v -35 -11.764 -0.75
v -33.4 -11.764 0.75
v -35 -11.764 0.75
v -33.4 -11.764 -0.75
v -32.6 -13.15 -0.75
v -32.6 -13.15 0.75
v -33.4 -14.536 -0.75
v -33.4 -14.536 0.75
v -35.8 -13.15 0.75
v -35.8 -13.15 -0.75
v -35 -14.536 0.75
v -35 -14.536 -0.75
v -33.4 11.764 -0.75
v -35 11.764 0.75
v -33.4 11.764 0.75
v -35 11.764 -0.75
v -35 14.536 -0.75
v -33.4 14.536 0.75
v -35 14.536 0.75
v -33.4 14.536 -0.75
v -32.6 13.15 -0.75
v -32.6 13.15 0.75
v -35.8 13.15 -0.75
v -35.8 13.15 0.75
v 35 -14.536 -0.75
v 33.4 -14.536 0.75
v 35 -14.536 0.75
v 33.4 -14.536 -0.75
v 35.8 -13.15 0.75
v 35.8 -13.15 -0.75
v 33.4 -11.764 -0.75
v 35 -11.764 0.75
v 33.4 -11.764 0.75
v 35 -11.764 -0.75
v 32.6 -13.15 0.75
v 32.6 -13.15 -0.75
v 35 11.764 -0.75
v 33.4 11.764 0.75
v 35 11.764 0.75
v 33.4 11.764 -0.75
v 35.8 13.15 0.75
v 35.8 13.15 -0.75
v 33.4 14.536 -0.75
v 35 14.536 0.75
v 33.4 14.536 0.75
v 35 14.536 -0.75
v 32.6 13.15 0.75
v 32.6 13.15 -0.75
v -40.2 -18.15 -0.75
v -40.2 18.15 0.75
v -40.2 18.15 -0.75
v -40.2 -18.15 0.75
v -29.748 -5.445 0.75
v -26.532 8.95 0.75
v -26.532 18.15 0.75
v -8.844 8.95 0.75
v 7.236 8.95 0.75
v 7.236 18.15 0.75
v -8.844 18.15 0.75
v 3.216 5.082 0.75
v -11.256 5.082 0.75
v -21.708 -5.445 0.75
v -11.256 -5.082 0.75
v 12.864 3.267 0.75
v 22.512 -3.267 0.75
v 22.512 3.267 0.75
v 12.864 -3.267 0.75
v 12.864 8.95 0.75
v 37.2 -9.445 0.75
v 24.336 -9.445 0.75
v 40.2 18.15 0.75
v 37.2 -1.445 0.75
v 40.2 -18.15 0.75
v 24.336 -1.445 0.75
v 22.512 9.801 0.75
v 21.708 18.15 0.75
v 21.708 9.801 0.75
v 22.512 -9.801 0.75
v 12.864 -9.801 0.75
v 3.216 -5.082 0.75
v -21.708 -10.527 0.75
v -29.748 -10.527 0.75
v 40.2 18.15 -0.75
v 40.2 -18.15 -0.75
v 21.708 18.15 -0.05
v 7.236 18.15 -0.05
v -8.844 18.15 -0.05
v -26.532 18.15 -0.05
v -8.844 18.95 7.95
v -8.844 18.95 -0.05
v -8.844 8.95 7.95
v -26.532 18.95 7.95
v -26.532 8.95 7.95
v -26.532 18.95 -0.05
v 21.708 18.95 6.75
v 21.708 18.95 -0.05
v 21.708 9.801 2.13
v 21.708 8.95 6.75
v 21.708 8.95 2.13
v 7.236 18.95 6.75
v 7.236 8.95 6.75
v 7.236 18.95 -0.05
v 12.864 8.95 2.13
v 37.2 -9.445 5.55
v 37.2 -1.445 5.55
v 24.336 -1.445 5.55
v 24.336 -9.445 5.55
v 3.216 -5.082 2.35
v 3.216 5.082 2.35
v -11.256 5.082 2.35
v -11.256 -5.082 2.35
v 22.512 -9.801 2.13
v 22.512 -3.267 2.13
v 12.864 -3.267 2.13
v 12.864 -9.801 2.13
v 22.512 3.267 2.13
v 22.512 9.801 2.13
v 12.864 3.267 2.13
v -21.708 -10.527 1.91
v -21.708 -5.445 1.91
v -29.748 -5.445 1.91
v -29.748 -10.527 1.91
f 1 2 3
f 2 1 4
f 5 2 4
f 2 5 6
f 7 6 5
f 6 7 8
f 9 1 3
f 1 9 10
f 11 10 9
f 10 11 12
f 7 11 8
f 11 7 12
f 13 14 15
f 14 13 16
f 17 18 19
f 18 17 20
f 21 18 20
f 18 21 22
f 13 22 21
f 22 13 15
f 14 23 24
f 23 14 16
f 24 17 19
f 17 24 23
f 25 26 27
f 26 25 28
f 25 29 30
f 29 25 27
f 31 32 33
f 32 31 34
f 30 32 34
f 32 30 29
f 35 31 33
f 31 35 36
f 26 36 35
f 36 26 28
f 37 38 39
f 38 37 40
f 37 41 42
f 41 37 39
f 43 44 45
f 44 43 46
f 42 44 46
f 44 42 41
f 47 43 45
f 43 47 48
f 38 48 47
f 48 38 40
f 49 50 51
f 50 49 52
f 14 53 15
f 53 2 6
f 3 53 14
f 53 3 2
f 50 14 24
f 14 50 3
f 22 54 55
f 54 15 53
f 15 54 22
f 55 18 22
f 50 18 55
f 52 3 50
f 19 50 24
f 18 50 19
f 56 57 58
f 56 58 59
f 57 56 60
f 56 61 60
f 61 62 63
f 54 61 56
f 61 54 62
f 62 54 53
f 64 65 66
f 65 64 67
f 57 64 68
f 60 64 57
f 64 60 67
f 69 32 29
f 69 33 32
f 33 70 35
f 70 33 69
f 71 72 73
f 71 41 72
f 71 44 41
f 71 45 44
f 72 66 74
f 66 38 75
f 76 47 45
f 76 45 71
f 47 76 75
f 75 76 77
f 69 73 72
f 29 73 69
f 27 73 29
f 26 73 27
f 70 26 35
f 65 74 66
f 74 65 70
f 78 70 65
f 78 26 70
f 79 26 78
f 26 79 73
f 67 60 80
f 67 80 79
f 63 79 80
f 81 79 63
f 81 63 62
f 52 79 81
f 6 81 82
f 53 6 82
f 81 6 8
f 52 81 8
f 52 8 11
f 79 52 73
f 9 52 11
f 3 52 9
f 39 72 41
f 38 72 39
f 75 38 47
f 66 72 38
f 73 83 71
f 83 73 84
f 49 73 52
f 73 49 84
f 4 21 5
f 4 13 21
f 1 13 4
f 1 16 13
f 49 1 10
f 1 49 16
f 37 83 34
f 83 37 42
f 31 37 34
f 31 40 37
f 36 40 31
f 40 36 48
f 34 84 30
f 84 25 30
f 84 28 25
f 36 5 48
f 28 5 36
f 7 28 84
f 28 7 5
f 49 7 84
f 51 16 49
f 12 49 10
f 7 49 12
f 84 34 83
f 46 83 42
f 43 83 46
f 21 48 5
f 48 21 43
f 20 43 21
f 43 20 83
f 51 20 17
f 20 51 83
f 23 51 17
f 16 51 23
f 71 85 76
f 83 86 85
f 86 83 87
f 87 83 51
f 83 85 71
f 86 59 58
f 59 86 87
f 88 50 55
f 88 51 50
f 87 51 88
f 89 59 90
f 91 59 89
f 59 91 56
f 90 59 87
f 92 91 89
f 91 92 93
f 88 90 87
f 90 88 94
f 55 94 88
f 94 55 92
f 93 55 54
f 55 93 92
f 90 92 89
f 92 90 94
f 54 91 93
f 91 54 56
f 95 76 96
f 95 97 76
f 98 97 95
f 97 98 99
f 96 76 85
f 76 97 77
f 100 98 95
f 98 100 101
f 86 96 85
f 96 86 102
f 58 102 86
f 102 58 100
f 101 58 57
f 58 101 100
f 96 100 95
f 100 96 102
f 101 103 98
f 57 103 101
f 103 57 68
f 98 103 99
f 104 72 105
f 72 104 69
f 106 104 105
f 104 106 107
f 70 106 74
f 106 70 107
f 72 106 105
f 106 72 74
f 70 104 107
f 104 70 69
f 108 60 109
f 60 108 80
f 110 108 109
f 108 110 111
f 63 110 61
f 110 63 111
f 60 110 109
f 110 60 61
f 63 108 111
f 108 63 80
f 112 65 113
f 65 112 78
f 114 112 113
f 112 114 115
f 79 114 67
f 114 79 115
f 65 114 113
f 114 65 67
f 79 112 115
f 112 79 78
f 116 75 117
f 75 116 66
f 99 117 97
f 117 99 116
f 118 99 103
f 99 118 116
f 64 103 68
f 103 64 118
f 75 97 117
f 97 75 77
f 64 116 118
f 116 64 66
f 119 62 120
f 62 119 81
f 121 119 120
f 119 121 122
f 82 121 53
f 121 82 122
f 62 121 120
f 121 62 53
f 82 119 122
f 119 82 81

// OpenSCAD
// Parameters
pcb_length = 80.4; //[40.2:160.8:0.1]
pcb_width = 36.3; //[18.15:72.6:0.1]
pcb_thickness = 1.5; //[0.8:3:0.1]
corner_radius = 3; //[1.5:6:0.1]
hole_diameter = 3.2; //[2:5:0.1]
hole_edge_margin_x = 6; //[3:12:0.1]
hole_edge_margin_y = 5; //[3:10:0.1]
hole_cut_extra = 0.4; //[0.2:1.5:0.1]
connectors_height = 8; //[4:16:0.5]
connectors_depth = 10; //[5:20:0.5]
connectors_wall_overlap = 0.8; //[0.5:2:0.1]
chip_height = 2.2; //[1:5:0.1]
chip_overlap = 0.6; //[0.3:1.5:0.1]
silkscreen_height = 0.2; //[0.1:0.6:0.05]
silkscreen_overlap = 0.3; //[0.2:1:0.05]

// Main PCB Body with Rounded Corners
module pcb_main_body() {
  color([0.0, 0.4, 0.2]) // Green PCB
  hull() {
    translate([0, 0, 0])
      cube([pcb_length, pcb_width, pcb_thickness], center=true);
    translate([pcb_length/2 - corner_radius, pcb_width/2 - corner_radius, 0])
      cylinder(r=corner_radius, h=pcb_thickness, center=true);
    translate([-(pcb_length/2 - corner_radius), pcb_width/2 - corner_radius, 0])
      cylinder(r=corner_radius, h=pcb_thickness, center=true);
    translate([-(pcb_length/2 - corner_radius), -(pcb_width/2 - corner_radius), 0])
      cylinder(r=corner_radius, h=pcb_thickness, center=true);
    translate([pcb_length/2 - corner_radius, -(pcb_width/2 - corner_radius), 0])
      cylinder(r=corner_radius, h=pcb_thickness, center=true);
  }
}

// Mounting Holes
module mounting_holes() {
  color("Black")
  for (x = [-1, 1])
    for (y = [-1, 1])
      translate([x * (pcb_length/2 - hole_edge_margin_x), y * (pcb_width/2 - hole_edge_margin_y), 0])
        cylinder(r=hole_diameter/2, h=pcb_thickness + hole_cut_extra, center=true);
}

// Connectors
module connectors() {
  color([0.15, 0.15, 0.17]) // Black anodized aluminum
  union() {
    translate([-pcb_length*0.22, pcb_width/2 - connectors_depth/2 + connectors_wall_overlap, pcb_thickness/2 + connectors_height/2 - connectors_wall_overlap])
      cube([pcb_length*0.22, connectors_depth, connectors_height], center=true);
    translate([pcb_length*0.18, pcb_width/2 - connectors_depth/2 + connectors_wall_overlap, pcb_thickness/2 + (connectors_height*0.85)/2 - connectors_wall_overlap])
      cube([pcb_length*0.18, connectors_depth, connectors_height*0.85], center=true);
    translate([pcb_length/2 - (pcb_length*0.16)/2 - corner_radius, -pcb_width*0.15, pcb_thickness/2 + (connectors_height*0.7)/2 - connectors_wall_overlap])
      cube([pcb_length*0.16, connectors_depth*0.8, connectors_height*0.7], center=true);
  }
}

// Chips and Components
module chips_components() {
  color([0.4, 0.4, 0.43]) // Steel parts
  union() {
    translate([-pcb_length*0.05, 0, pcb_thickness/2 + chip_height/2 - chip_overlap])
      cube([pcb_length*0.18, pcb_width*0.28, chip_height], center=true);
    translate([pcb_length*0.22, -pcb_width*0.18, pcb_thickness/2 + (chip_height*0.9)/2 - chip_overlap])
      cube([pcb_length*0.12, pcb_width*0.18, chip_height*0.9], center=true);
    translate([pcb_length*0.22, pcb_width*0.18, pcb_thickness/2 + (chip_height*0.9)/2 - chip_overlap])
      cube([pcb_length*0.12, pcb_width*0.18, chip_height*0.9], center=true);
    translate([-pcb_length*0.32, -pcb_width*0.22, pcb_thickness/2 + (chip_height*0.8)/2 - chip_overlap])
      cube([pcb_length*0.1, pcb_width*0.14, chip_height*0.8], center=true);
  }
}

// Silkscreen Markings
module silkscreen_markings() {
  color("White")
  union() {
    translate([0, pcb_width/2 - (pcb_width*0.03)/2 - corner_radius/2, pcb_thickness/2 + silkscreen_height/2 - silkscreen_overlap])
      cube([pcb_length - 2*corner_radius, pcb_width*0.03, silkscreen_height], center=true);
    translate([-pcb_length/2 + (pcb_length*0.03)/2 + corner_radius/2, 0, pcb_thickness/2 + silkscreen_height/2 - silkscreen_overlap])
      cube([pcb_length*0.03, pcb_width - 2*corner_radius, silkscreen_height], center=true);
  }
}

// Complete PCB Model
module pcb_complete_model() {
  difference() {
    pcb_main_body();
    mounting_holes();
  }
  connectors();
  chips_components();
  silkscreen_markings();
}

// Render the complete model
pcb_complete_model();
